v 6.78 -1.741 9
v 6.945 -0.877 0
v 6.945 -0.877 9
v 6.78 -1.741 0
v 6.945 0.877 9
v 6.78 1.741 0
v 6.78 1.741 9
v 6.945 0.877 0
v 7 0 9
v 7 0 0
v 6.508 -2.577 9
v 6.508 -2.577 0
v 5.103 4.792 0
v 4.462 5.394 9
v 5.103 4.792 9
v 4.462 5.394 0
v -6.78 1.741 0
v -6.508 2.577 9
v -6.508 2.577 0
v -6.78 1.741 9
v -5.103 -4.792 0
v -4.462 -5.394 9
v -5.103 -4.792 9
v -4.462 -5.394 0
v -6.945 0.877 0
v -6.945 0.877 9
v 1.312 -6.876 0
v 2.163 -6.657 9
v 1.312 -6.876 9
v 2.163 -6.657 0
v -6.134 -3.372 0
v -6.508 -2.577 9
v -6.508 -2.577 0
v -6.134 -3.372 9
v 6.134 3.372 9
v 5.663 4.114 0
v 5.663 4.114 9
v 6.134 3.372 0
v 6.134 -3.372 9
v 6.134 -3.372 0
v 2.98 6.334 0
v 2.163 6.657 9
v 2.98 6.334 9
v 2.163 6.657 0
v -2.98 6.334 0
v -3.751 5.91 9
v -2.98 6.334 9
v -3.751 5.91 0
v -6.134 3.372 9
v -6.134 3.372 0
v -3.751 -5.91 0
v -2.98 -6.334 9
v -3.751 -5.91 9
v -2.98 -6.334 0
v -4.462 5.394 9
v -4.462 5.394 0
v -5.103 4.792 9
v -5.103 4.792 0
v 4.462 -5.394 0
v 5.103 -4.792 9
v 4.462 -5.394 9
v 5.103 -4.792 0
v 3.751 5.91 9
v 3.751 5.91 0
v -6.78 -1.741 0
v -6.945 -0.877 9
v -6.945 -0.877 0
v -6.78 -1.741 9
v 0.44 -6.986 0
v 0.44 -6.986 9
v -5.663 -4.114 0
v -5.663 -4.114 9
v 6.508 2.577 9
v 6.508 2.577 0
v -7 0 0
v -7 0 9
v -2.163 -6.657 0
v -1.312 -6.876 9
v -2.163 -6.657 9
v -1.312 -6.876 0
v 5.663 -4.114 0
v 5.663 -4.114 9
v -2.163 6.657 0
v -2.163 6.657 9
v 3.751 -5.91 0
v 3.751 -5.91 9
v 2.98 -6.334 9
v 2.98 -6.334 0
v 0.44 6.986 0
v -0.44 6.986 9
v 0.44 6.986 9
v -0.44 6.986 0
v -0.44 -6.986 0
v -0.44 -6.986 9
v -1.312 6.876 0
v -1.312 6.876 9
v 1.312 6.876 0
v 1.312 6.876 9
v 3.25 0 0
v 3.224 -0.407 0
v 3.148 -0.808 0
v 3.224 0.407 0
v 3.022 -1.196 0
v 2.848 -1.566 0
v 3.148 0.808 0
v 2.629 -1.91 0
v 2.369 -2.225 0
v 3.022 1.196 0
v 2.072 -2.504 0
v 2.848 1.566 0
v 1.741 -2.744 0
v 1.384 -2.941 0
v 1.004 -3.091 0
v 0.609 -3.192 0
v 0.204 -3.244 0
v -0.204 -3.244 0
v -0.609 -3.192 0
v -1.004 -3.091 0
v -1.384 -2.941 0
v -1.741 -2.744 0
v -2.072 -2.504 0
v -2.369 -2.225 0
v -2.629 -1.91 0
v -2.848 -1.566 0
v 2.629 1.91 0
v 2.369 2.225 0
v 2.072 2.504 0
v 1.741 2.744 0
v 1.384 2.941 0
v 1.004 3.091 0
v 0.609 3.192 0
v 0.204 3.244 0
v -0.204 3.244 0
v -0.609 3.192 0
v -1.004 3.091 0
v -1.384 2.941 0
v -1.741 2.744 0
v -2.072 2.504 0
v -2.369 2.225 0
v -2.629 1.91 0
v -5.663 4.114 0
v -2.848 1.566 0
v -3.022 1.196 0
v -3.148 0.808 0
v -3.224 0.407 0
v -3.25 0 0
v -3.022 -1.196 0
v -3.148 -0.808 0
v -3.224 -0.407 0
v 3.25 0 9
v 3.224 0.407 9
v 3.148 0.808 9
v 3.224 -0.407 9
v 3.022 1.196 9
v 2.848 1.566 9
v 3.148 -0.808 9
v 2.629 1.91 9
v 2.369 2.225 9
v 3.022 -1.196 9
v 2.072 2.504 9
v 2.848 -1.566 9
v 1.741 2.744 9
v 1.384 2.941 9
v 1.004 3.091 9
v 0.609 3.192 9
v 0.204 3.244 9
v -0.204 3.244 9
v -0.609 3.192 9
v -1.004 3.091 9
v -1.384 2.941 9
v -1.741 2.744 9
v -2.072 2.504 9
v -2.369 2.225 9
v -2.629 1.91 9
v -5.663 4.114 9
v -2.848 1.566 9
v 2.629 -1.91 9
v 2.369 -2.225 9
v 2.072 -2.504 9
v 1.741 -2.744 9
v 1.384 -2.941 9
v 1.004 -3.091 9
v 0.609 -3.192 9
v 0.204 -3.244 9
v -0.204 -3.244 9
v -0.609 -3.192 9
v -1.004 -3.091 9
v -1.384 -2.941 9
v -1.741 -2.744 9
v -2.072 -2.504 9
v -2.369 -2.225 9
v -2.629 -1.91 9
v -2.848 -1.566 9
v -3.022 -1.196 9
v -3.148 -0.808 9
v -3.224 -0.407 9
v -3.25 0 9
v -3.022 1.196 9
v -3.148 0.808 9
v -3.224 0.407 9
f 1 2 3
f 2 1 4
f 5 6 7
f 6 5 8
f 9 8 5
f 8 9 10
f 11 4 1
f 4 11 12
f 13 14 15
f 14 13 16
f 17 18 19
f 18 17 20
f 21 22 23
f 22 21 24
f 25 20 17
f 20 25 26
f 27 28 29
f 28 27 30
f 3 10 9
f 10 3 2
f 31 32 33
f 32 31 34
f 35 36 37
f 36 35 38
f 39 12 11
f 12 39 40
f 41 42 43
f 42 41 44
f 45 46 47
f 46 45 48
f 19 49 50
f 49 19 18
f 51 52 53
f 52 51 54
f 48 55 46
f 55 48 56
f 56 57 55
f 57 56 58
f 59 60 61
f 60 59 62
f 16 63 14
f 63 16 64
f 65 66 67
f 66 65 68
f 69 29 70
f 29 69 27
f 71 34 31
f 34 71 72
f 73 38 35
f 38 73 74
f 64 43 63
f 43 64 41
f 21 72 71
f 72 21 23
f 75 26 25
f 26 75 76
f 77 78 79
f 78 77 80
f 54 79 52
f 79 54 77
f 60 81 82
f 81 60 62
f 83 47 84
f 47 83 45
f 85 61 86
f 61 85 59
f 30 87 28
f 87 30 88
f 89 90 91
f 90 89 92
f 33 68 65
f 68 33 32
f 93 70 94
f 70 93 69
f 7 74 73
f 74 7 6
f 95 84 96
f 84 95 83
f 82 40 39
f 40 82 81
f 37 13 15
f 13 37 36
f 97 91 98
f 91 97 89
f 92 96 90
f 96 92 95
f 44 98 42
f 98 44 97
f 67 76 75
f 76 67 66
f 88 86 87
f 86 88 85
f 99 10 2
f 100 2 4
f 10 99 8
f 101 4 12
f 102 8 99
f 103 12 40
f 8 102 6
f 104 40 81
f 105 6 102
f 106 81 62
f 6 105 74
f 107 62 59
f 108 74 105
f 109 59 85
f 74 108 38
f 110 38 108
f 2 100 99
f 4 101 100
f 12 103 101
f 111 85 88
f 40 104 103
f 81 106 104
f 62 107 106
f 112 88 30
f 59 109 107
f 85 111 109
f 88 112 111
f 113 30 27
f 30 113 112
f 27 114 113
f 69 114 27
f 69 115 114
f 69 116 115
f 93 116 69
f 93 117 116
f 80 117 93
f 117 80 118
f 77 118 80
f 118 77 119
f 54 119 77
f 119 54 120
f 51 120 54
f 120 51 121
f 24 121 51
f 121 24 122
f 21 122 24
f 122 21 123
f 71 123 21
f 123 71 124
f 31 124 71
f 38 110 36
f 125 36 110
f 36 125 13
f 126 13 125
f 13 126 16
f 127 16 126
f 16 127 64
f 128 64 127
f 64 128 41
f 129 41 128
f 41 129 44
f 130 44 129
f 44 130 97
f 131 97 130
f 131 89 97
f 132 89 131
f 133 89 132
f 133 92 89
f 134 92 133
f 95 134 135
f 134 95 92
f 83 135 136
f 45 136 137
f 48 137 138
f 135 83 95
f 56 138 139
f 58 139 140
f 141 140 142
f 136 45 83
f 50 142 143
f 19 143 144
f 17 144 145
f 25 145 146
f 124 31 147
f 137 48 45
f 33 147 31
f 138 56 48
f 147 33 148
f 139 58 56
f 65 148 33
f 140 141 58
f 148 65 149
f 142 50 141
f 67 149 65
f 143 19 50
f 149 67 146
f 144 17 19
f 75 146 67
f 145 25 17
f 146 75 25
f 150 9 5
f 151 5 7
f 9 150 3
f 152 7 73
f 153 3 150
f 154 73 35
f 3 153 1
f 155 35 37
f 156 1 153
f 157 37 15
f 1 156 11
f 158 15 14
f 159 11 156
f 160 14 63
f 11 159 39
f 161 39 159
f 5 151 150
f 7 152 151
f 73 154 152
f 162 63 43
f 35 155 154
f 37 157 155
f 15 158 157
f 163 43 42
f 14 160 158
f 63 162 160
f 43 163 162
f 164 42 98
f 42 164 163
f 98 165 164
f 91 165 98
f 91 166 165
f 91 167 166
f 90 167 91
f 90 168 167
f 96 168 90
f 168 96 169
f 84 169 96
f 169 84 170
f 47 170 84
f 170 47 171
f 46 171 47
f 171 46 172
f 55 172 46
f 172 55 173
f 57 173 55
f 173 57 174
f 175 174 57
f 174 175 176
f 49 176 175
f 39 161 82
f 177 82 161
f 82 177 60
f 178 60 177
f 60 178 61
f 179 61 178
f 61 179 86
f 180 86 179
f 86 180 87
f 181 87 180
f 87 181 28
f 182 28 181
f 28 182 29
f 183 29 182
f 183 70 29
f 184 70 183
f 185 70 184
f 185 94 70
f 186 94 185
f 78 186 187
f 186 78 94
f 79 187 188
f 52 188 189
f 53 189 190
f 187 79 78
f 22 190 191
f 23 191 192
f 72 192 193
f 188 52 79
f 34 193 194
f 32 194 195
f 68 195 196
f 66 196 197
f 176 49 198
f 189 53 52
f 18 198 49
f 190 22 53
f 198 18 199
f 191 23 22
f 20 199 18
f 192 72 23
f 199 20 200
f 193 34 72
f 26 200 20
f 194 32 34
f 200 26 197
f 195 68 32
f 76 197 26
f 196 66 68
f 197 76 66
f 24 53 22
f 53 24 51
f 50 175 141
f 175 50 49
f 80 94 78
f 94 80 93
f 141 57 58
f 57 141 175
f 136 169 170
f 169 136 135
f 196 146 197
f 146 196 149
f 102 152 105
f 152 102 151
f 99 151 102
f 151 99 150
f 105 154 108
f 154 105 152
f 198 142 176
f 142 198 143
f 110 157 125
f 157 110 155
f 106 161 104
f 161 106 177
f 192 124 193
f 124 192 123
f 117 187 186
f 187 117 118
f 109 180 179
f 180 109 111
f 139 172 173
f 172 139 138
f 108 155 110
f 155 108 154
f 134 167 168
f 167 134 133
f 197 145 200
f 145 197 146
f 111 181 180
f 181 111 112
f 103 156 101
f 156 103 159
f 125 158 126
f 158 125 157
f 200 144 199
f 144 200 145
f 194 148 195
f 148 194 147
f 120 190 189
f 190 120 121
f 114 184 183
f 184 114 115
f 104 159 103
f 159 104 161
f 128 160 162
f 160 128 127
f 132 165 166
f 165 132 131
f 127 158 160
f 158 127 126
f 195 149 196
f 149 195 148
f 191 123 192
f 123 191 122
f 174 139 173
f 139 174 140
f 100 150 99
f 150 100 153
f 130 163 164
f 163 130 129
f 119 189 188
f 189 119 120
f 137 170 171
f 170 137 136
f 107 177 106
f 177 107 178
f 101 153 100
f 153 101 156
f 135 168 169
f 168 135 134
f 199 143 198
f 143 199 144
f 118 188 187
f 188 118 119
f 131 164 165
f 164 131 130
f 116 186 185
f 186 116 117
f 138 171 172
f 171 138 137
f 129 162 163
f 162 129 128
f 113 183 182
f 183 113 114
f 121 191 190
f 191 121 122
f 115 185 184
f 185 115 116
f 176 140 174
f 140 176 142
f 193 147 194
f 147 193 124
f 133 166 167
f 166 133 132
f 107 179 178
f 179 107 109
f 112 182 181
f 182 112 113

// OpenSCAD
$fn = 50;


difference() {
	union() {
		cylinder(h = 9, r = 7.0000000000);
	}
	union() {
		translate(v = [0.0000000000, 0.0000000000, -100.0000000000]) {
			cylinder(h = 200, r = 3.2500000000);
		}
	}
}
